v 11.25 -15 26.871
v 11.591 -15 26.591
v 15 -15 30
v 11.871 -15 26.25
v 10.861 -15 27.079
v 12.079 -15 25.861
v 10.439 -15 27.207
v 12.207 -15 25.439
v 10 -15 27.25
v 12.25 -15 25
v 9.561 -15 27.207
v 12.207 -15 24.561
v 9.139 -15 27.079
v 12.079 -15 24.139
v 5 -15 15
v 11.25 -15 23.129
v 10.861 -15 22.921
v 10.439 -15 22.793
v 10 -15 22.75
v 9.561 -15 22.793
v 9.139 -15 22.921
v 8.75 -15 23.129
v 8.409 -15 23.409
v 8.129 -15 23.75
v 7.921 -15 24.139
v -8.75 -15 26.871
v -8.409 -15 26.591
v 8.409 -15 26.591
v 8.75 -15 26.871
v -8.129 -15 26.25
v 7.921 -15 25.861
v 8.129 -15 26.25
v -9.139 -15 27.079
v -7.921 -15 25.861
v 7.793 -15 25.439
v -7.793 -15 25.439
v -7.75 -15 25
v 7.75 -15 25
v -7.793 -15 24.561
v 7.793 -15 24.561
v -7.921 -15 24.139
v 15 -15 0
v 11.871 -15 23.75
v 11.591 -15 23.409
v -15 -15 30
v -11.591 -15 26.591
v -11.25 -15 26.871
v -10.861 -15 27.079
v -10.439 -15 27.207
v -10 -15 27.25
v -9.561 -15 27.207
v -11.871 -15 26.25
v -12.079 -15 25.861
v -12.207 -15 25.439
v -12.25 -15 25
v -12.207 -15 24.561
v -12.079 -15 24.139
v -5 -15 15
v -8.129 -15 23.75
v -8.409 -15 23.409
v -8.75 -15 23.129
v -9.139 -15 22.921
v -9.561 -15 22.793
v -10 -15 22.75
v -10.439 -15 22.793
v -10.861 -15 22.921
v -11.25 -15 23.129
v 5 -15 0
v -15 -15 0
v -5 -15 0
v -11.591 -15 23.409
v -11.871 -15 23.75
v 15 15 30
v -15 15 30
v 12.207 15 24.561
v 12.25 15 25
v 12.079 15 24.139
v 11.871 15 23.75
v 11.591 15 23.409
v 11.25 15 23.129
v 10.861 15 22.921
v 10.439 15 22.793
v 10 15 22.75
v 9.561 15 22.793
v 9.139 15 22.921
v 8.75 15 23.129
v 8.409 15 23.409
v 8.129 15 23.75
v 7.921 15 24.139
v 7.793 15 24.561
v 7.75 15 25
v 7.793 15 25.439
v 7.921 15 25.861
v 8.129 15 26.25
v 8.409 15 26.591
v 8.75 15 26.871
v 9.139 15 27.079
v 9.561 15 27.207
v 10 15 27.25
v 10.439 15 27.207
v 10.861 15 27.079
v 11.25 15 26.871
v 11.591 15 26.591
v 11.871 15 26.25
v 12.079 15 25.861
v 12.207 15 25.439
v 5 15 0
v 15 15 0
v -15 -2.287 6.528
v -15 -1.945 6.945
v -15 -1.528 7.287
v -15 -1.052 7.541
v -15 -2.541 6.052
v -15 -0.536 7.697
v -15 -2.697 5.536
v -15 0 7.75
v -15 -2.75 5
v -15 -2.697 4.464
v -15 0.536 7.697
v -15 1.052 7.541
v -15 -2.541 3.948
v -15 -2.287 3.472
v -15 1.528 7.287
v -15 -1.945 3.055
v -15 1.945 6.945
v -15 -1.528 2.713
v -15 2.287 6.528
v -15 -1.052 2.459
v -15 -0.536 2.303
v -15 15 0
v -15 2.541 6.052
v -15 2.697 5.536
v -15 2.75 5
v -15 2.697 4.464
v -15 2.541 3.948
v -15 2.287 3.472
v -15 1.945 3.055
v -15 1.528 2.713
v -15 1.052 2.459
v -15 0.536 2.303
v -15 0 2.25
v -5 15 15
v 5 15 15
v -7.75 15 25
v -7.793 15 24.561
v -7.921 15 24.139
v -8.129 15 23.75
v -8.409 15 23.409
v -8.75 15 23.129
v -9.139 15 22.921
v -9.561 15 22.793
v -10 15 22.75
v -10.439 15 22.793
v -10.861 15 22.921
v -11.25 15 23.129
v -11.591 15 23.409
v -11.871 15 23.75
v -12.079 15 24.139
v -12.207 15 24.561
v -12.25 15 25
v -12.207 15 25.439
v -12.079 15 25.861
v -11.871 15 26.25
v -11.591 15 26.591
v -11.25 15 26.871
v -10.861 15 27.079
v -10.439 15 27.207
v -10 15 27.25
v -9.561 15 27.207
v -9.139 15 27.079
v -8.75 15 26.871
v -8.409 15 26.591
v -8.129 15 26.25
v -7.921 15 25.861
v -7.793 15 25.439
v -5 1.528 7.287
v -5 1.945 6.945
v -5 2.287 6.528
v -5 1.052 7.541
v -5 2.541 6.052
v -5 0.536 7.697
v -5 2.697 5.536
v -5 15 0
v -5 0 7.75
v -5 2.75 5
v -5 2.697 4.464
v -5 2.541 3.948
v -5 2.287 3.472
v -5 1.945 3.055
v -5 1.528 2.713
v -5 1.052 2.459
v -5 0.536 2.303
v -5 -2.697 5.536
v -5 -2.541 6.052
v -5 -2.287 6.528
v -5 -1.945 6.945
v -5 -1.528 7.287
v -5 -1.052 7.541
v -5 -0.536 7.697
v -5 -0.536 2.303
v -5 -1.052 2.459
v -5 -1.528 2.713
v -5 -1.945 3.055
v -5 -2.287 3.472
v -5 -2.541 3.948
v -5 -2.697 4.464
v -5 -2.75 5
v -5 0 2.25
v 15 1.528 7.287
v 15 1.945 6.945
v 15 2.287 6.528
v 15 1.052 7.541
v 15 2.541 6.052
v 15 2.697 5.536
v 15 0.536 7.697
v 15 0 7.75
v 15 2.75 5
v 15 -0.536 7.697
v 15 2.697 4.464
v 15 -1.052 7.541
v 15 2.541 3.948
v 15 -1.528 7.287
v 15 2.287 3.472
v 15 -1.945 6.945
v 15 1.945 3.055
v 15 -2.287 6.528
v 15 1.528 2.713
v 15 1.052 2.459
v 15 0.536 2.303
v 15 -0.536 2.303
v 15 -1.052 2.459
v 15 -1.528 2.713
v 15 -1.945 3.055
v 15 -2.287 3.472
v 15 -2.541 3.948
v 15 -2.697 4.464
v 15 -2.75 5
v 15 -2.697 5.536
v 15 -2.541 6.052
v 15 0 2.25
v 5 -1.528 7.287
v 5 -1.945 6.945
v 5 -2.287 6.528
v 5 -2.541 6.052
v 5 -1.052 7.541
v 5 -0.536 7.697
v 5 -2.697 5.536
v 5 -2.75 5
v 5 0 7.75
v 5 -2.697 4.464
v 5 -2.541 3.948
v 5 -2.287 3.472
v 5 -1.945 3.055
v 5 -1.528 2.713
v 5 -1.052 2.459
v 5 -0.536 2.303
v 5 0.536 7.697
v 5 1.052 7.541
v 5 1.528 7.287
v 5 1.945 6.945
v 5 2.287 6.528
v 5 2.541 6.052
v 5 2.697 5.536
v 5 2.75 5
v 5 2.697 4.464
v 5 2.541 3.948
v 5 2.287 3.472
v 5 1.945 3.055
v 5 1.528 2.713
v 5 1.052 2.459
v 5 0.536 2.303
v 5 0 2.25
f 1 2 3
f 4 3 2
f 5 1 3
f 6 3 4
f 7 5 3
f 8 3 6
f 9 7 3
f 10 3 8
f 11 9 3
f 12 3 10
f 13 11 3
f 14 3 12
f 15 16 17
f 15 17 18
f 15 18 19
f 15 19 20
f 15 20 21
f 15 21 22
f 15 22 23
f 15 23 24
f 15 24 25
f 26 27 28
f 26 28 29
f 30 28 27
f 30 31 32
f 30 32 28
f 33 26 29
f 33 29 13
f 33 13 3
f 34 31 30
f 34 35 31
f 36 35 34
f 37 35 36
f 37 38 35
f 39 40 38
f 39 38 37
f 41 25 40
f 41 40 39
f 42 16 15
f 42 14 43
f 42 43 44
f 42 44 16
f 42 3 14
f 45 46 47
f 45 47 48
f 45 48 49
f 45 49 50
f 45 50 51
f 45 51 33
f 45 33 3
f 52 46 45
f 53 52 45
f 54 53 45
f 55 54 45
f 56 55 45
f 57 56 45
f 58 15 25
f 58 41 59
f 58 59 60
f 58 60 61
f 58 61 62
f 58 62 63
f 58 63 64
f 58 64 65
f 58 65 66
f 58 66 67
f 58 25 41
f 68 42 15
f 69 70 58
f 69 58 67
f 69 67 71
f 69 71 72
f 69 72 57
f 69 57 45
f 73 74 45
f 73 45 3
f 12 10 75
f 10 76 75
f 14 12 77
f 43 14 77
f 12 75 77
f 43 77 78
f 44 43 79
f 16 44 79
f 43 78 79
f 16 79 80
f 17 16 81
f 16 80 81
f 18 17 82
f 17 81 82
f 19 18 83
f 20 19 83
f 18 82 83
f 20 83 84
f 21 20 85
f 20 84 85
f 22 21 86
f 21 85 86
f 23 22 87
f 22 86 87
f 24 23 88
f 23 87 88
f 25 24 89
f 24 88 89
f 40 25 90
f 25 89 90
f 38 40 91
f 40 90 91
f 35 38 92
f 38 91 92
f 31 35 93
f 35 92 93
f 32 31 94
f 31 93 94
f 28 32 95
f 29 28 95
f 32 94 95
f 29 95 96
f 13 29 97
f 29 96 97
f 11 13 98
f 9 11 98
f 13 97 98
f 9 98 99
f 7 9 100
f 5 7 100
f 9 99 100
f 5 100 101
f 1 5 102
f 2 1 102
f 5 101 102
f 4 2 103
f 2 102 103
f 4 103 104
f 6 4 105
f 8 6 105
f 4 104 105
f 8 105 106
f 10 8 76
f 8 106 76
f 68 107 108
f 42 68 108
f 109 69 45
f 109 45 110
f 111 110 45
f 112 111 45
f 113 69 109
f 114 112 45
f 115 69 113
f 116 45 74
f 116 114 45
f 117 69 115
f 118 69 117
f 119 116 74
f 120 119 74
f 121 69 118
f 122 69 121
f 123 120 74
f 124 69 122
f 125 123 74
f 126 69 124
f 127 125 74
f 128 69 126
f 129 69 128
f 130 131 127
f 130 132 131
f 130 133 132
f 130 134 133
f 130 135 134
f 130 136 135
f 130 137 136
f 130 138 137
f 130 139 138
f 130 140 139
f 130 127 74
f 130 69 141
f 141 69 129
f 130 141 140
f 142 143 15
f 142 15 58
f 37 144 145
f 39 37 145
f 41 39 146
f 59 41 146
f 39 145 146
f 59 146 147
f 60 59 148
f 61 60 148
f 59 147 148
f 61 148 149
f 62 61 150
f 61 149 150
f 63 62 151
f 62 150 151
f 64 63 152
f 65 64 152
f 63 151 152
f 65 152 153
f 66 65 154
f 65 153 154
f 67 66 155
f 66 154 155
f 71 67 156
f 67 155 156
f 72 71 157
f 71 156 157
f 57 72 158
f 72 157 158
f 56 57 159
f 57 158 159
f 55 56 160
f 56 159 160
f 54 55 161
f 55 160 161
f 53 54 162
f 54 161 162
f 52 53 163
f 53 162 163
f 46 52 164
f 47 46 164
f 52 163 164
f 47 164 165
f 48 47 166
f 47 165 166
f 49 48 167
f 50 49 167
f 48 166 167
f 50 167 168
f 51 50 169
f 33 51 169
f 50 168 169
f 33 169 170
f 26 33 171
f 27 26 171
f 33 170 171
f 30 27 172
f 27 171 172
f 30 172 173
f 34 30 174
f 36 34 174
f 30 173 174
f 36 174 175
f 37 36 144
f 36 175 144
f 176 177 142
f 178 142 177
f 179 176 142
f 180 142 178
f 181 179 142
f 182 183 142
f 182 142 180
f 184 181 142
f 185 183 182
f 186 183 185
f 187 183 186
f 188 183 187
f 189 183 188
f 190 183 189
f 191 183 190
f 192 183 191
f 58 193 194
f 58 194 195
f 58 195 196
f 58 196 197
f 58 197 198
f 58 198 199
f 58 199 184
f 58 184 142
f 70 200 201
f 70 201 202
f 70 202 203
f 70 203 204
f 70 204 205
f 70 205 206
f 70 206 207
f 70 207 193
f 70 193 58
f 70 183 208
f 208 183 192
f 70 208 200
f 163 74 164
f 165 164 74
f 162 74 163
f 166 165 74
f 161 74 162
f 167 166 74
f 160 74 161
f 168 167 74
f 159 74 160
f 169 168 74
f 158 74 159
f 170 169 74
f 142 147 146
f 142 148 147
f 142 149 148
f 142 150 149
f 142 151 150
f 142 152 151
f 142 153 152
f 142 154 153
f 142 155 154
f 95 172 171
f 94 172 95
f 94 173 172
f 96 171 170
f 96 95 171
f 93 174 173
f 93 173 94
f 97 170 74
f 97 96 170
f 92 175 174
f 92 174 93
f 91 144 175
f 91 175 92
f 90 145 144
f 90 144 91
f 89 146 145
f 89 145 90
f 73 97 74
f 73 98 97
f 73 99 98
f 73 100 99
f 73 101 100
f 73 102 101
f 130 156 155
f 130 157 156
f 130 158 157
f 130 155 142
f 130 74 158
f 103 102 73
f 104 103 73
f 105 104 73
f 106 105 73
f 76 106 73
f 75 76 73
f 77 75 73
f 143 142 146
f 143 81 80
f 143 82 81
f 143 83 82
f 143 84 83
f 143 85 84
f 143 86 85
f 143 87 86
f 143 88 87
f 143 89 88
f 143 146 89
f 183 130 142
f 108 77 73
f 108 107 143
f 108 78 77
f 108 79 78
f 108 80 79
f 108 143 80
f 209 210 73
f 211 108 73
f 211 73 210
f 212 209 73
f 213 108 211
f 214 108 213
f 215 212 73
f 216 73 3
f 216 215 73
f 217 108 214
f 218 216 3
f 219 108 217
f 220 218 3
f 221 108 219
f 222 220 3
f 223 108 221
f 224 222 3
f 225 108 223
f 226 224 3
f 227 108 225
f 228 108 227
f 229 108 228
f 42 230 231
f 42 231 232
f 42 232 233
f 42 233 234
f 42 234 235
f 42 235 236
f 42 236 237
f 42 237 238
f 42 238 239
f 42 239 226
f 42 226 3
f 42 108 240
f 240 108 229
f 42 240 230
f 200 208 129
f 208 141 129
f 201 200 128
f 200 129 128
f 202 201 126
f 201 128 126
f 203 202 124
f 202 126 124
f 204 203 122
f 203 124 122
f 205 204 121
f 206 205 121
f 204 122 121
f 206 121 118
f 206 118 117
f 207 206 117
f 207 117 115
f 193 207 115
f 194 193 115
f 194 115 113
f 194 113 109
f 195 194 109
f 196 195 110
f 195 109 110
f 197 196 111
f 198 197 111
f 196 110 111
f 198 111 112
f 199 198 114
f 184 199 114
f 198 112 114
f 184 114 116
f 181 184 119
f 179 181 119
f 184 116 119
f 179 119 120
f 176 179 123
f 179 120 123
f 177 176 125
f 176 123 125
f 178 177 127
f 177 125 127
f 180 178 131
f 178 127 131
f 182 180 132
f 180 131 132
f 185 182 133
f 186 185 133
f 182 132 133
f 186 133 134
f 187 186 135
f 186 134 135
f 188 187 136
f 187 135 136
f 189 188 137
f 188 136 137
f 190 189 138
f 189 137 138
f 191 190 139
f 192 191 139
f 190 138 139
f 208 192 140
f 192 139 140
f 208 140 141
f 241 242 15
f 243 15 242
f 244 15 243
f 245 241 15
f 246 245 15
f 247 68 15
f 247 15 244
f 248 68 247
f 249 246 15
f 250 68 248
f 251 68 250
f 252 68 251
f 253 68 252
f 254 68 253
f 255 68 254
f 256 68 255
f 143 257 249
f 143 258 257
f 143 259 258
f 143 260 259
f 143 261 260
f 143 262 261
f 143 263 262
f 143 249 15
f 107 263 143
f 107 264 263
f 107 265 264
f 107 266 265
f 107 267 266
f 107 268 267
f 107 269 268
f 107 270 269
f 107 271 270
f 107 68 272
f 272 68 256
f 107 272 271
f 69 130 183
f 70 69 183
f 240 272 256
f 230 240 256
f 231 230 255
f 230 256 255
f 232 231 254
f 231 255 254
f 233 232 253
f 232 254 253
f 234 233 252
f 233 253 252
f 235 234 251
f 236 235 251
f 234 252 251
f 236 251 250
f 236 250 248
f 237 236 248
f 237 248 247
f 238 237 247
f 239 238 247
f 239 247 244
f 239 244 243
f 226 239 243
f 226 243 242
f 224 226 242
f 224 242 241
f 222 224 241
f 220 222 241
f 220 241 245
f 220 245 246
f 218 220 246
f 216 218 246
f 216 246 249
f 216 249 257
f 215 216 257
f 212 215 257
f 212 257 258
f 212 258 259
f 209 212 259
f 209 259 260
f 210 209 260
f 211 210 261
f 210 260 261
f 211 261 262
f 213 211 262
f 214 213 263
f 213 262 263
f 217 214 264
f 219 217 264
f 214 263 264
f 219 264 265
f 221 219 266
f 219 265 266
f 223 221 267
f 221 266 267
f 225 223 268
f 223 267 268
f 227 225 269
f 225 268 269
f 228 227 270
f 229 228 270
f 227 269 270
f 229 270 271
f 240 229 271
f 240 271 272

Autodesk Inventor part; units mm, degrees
ref_plane "YZ Plane" through (0, 0, 0) normal (1, 0, 0) x (0, 1, 0)
ref_plane "XZ Plane" through (0, 0, 0) normal (0, 1, 0) x (-1, 0, 0)
ref_plane "XY Plane" through (0, 0, 0) normal (0, 0, 1) x (1, 0, 0)
sketch "Sketch1" plane through (0, 0, 0) normal (0, 0, 1) x (1, 0, 0)
  line L0 (-15, 15) -> (15, 15)
  line L1 (15, 15) -> (15, -15)
  line L2 (15, -15) -> (-15, -15)
  line L3 (-15, -15) -> (-15, 15)
  point P0 (0, 0)
  point P1 (0, 15)
  point P2 (-15, 0)
  dimension "d0" = 30
  dimension "d1" = 30
extrude "Extrusion1" add sketch "Sketch1" along normal blind 30
sketch "Sketch4" plane through (0, 0, 0) normal (0, 0, -1) x (-1, 0, 0)
  line L0 (5, -15) -> (-5, -15)
  line L1 (-5, -15) -> (-5, 15)
  line L2 (-5, 15) -> (5, 15)
  line L3 (5, 15) -> (5, -15)
  line L4 (15, -15) -> (-15, -15) projected
  line L5 (-15, 15) -> (15, 15) projected
  point P0 (0, 0)
  point P1 (0, -15)
  dimension "d8" = 10
extrude "Extrusion3" cut sketch "Sketch4" against normal blind 15
sketch "Sketch5" plane through (15, -15, 0) normal (1, 0, 0) x (0, 0, -1)
  line L0 (0, 0) -> (0, 30) projected
  point P0 (0, 15)
  point P1 (-5, 15)
  point P2 (0, 15)
  dimension "d11" = 5
hole "Hole1" at (15, 0, 5) direction (-1, 0, 0) diameter 5.5 end through all
sketch "Sketch8" plane through (15, 15, 30) normal (0, 1, 0) x (1, 0, 0)
  line L0 (0, 0) -> (-30, 0) projected
  line L1 (0, 30) -> (0, 0) projected
  line L2 (0, 30) -> (-10, 30) projected
  line L3 (-10, 30) -> (-10, 15) projected
  line L4 (-10, 15) -> (-20, 15) projected
  line L5 (-20, 15) -> (-20, 30) projected
  line L6 (-20, 30) -> (-30, 30) projected
  circle A0 centre (-25, 5) radius 2.25
  circle A1 centre (-5, 5) radius 2.25
  line L7 (-30, 30) -> (-30, 0) projected
  point P0 (-15, 30)
  dimension "d28" = 4.5
  dimension "d30" = 5
  dimension "d31" = 5
  dimension "d32" = 5
extrude "Extrusion6" cut sketch "Sketch8" against normal through all contours A0 | A1
properties part number "0005-10-019 intinzator y"
